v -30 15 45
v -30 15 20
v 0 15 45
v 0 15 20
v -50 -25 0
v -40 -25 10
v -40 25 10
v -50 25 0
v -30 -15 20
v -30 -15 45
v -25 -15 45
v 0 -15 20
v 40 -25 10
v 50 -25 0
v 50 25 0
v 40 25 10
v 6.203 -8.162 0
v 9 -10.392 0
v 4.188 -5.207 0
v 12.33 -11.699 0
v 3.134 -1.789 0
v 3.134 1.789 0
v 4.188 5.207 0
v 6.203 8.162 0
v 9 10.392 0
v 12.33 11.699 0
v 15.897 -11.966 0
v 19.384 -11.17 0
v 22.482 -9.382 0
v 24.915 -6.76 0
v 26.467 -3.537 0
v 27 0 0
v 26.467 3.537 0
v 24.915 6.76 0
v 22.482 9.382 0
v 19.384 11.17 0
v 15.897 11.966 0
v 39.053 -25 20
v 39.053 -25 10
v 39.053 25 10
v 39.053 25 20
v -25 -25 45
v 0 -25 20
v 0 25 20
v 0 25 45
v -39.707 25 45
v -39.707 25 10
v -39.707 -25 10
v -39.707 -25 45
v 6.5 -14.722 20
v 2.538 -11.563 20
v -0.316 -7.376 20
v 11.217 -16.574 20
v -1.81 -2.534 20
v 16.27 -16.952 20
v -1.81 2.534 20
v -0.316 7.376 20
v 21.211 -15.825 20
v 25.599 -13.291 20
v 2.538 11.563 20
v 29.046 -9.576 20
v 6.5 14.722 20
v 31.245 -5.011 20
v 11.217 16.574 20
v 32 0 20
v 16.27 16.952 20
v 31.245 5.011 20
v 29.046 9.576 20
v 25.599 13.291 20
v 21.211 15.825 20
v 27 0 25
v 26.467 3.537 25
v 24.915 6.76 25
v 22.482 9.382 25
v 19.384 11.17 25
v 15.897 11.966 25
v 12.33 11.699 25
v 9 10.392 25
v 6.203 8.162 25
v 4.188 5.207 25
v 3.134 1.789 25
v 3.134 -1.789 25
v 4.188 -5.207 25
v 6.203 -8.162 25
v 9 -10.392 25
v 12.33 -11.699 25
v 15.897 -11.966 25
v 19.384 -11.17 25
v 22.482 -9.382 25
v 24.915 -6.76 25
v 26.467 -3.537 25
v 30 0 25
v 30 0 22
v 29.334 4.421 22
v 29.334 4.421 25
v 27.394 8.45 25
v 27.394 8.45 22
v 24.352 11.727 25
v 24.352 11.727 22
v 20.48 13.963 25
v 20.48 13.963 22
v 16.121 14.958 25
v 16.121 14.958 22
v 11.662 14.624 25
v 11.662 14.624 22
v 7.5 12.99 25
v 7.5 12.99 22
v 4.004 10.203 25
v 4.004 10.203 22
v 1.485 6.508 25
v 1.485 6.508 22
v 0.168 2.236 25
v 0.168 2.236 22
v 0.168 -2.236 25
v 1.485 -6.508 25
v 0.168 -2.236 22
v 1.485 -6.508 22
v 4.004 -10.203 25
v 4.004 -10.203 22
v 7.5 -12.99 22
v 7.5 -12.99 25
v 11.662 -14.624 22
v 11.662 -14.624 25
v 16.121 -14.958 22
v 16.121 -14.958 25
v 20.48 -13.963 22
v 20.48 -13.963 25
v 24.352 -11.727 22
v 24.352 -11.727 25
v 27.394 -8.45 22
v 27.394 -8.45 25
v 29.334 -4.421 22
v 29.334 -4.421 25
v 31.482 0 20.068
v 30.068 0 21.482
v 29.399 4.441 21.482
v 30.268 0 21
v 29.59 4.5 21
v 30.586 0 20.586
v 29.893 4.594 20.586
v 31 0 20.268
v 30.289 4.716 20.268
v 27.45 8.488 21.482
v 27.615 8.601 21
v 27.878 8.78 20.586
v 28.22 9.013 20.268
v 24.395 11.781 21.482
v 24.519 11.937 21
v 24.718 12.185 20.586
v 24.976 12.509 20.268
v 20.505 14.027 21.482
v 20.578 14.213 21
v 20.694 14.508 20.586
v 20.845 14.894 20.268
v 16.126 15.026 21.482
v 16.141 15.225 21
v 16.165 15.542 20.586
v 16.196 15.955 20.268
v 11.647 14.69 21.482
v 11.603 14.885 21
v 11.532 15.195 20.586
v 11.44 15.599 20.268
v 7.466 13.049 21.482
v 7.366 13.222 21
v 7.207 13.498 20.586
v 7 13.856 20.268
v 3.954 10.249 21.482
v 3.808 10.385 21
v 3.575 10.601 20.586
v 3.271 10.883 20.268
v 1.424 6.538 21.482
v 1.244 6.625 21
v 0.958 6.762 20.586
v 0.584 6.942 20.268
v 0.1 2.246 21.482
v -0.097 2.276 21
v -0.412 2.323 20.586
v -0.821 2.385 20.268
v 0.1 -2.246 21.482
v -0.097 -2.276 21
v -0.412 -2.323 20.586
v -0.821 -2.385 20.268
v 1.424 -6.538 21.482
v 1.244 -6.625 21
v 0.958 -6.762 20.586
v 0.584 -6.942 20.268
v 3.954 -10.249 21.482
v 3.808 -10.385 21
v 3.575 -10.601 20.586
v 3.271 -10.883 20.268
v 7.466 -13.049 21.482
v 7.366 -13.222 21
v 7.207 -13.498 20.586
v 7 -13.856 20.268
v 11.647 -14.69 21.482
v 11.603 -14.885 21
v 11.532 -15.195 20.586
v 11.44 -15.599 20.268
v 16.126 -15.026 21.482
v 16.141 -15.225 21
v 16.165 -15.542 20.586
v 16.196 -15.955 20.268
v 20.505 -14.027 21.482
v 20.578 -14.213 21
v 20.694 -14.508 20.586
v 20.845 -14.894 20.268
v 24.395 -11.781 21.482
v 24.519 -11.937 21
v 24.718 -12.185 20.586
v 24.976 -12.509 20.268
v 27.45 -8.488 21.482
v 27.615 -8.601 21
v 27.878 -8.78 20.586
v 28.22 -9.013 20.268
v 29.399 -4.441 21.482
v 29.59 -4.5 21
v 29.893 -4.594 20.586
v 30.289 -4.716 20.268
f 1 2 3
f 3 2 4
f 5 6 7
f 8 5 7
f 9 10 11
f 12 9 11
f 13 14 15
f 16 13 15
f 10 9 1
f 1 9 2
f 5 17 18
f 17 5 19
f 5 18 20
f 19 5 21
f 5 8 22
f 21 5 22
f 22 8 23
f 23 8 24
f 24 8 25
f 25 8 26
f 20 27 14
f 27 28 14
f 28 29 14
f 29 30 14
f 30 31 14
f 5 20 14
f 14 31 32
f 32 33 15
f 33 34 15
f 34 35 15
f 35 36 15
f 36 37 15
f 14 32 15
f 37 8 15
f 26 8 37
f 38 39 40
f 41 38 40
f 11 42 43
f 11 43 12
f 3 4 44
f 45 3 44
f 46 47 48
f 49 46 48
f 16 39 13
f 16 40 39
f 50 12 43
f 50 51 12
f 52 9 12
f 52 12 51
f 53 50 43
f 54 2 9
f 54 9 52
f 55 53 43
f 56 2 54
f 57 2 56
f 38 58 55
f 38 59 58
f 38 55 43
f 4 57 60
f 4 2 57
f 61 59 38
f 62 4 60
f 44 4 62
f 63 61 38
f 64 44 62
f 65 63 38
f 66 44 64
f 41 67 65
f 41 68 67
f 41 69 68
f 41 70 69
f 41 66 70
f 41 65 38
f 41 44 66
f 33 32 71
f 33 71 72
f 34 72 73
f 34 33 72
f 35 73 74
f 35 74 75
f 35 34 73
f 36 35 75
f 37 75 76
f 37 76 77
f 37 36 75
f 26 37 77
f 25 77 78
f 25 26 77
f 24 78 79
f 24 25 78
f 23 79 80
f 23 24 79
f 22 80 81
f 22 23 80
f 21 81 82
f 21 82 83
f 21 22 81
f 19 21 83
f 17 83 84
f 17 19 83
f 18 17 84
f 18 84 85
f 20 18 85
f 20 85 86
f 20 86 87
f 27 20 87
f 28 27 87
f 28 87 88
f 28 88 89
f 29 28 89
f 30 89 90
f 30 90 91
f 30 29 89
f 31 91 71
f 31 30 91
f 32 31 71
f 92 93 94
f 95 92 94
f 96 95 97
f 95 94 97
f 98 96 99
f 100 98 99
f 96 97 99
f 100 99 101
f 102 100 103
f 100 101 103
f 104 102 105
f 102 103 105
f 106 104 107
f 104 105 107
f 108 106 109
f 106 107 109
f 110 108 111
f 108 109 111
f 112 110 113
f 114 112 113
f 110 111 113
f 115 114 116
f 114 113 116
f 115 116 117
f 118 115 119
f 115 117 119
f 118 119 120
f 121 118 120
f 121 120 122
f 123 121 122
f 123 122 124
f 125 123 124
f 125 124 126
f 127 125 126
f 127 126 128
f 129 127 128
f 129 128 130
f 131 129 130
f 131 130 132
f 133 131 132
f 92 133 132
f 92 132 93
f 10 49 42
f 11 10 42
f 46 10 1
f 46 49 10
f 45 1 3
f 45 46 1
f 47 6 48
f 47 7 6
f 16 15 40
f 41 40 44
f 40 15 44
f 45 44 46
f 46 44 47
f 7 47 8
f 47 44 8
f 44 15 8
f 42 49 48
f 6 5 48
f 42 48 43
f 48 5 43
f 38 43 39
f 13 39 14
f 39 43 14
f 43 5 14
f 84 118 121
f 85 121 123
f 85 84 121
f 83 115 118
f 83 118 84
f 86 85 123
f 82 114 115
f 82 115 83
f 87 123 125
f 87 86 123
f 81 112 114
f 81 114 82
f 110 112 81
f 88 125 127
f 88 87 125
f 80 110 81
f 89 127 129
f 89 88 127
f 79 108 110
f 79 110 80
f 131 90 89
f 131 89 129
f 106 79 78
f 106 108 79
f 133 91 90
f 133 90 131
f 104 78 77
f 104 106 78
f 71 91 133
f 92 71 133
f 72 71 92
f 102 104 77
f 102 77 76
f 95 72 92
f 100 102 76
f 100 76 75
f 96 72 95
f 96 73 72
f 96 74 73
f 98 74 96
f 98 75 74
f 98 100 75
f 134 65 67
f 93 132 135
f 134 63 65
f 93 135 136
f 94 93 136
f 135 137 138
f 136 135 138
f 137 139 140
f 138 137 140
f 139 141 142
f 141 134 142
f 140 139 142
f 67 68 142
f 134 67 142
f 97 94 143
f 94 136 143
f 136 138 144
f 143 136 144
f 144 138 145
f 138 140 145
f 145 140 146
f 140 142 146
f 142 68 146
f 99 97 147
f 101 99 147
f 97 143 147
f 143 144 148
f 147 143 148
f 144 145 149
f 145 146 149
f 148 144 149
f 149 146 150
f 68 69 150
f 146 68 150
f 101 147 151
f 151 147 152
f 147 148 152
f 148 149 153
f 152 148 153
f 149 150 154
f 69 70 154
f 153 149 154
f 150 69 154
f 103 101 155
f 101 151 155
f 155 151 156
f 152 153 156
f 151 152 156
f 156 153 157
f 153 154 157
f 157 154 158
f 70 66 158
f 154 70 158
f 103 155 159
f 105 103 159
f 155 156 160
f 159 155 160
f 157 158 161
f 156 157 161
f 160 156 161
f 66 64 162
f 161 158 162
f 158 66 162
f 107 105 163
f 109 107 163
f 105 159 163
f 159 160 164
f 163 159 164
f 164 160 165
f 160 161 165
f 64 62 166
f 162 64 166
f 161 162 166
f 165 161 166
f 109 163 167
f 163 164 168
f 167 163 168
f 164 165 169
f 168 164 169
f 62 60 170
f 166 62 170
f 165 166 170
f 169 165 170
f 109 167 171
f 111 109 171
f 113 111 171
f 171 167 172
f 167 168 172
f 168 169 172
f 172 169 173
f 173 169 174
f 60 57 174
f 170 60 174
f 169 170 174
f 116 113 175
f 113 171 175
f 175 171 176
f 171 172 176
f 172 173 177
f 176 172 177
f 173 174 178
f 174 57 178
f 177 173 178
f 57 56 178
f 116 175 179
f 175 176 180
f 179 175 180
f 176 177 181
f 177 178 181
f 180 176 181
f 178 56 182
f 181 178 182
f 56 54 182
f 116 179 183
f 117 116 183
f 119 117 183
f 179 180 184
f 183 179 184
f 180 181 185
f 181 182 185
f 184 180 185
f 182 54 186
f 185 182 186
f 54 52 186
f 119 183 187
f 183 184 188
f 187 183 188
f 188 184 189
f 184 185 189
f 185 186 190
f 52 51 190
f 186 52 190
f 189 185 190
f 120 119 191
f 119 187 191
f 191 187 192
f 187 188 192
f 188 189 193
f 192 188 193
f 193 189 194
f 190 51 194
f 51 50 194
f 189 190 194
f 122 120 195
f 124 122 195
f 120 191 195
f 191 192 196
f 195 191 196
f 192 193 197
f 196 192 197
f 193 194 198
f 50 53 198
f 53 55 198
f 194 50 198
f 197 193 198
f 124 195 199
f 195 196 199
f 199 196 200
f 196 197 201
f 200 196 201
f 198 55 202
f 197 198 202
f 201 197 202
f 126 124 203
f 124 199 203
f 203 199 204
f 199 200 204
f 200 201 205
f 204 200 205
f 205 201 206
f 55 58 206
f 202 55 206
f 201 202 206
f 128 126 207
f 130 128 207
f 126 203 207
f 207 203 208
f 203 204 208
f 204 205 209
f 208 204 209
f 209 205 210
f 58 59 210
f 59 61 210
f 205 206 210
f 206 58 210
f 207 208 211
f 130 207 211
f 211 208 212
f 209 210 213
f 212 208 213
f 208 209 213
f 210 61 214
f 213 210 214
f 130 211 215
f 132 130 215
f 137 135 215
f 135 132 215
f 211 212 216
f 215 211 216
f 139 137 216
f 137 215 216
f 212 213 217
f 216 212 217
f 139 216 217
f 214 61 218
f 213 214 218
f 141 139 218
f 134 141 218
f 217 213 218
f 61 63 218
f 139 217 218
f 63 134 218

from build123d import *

# Parameters (mm, degrees)
ESQUISSE1_W        = 10.293411782
ESQUISSE1_H        = 50
BOSS_EXTRU_1_DEPTH = 10
ESQUISSE1_5_W      = 30
ESQUISSE1_5_H      = 10
BOSS_EXTRU_2_DEPTH = 45
ESQUISSE1_6_W      = 10.946693759
ESQUISSE1_6_H      = 50
ESQUISSE1_6_W_2    = 10.293411782
BOSS_EXTRU_3_DEPTH = 10
ESQUISSE1_7_R      = 15
ESQUISSE1_7_R_2    = 12
BOSS_EXTRU_4_DEPTH = 25
ESQUISSE1_8_R      = 15
BOSS_EXTRU_5_DEPTH = 20
CONG_3_R           = 2
CHANFREIN2_SIZE    = 25
CHANFREIN21_SIZE   = 10
CHANFREIN22_SIZE   = 10


with BuildPart() as part:
    # Esquisse1 → Boss.-Extru.1 (new body)
    with BuildSketch(Plane.XY):
        with Locations((-44.853294109, 0)):
            Rectangle(ESQUISSE1_W, ESQUISSE1_H)
    extrude(amount=BOSS_EXTRU_1_DEPTH)

    # Esquisse1<5> → Boss.-Extru.2 (add)
    with BuildSketch(Plane.XY):
        Polygon((-30, 25), (-39.706588218, 25), (-39.706588218, -25), (-30, -25), (-30, -15), (-30, 15), align=None)
        with Locations((-15, -20)):
            Rectangle(ESQUISSE1_5_W, ESQUISSE1_5_H)
        with Locations((-15, 20)):
            Rectangle(ESQUISSE1_5_W, ESQUISSE1_5_H)
    extrude(amount=BOSS_EXTRU_2_DEPTH)

    # Esquisse1<6> → Boss.-Extru.3 (add)
    with BuildSketch(Plane.XY):
        with Locations((44.526653121, 0)):
            Rectangle(ESQUISSE1_6_W, ESQUISSE1_6_H)
        with Locations((-44.853294109, 0)):
            Rectangle(ESQUISSE1_6_W_2, ESQUISSE1_6_H)
    extrude(amount=BOSS_EXTRU_3_DEPTH)


with BuildPart() as boss_extru_3_piece_1:
    # of the separate pieces the step leaves, piece 1, a body of its own (boss_extru_3_pieces)
    add(part.part.solids().sort_by_distance((-50, 25, 0))[0])



with BuildPart() as boss_extru_3_piece_2:
    # of the separate pieces the step leaves, piece 2, a body of its own (boss_extru_3_pieces)
    add(part.part.solids().sort_by_distance((39.053306241, -25, 0))[0])


with BuildPart() as body_3:
    # Esquisse1<7> → Boss.-Extru.4 (new body)
    with BuildSketch(Plane.XY):
        with Locations((15, 0)):
            Circle(ESQUISSE1_7_R)
        with Locations((15, 0)):
            Circle(ESQUISSE1_7_R_2, mode=Mode.SUBTRACT)
    extrude(amount=BOSS_EXTRU_4_DEPTH)


with BuildPart() as boss_extru_3_piece_1_1:
    add(boss_extru_3_piece_1.part)

    add(boss_extru_3_piece_2.part)  # Boss.-Extru.5 merges Boss.-Extru.3 piece 2

    add(body_3.part)  # Boss.-Extru.5 merges body 3
    # Esquisse1<8> → Boss.-Extru.5 (add)
    with BuildSketch(Plane.XY):
        Polygon((39.053306241, 25), (0, 25), (0, 15), (-30, 15), (-30, -15), (0, -15), (0, -25), (39.053306241, -25), align=None)
        with Locations((15, 0)):
            Circle(ESQUISSE1_8_R, mode=Mode.SUBTRACT)
    extrude(amount=BOSS_EXTRU_5_DEPTH)

    # Congé3
    cong_3_edges = [boss_extru_3_piece_1_1.edges().sort_by_distance(p)[0] for p in [
        (0, 0, 20),
    ]]
    fillet(cong_3_edges, radius=CONG_3_R)

    # Chanfrein2
    chanfrein2_edges = [boss_extru_3_piece_1_1.edges().sort_by_distance(p)[0] for p in [
        (0, -20, 45),
    ]]
    chamfer(chanfrein2_edges, length=CHANFREIN2_SIZE - 0.0001)  # a hair under: the kernel refuses the full size

    # Chanfrein21
    chanfrein21_edges = [boss_extru_3_piece_1_1.edges().sort_by_distance(p)[0] for p in [
        (50, 0, 10),
    ]]
    chamfer(chanfrein21_edges, length=CHANFREIN21_SIZE - 0.0001)  # a hair under: the kernel refuses the full size

    # Chanfrein22
    chanfrein22_edges = [boss_extru_3_piece_1_1.edges().sort_by_distance(p)[0] for p in [
        (-50, 0, 10),
    ]]
    chamfer(chanfrein22_edges, length=CHANFREIN22_SIZE - 0.0001)  # a hair under: the kernel refuses the full size


solid = boss_extru_3_piece_1_1.part
